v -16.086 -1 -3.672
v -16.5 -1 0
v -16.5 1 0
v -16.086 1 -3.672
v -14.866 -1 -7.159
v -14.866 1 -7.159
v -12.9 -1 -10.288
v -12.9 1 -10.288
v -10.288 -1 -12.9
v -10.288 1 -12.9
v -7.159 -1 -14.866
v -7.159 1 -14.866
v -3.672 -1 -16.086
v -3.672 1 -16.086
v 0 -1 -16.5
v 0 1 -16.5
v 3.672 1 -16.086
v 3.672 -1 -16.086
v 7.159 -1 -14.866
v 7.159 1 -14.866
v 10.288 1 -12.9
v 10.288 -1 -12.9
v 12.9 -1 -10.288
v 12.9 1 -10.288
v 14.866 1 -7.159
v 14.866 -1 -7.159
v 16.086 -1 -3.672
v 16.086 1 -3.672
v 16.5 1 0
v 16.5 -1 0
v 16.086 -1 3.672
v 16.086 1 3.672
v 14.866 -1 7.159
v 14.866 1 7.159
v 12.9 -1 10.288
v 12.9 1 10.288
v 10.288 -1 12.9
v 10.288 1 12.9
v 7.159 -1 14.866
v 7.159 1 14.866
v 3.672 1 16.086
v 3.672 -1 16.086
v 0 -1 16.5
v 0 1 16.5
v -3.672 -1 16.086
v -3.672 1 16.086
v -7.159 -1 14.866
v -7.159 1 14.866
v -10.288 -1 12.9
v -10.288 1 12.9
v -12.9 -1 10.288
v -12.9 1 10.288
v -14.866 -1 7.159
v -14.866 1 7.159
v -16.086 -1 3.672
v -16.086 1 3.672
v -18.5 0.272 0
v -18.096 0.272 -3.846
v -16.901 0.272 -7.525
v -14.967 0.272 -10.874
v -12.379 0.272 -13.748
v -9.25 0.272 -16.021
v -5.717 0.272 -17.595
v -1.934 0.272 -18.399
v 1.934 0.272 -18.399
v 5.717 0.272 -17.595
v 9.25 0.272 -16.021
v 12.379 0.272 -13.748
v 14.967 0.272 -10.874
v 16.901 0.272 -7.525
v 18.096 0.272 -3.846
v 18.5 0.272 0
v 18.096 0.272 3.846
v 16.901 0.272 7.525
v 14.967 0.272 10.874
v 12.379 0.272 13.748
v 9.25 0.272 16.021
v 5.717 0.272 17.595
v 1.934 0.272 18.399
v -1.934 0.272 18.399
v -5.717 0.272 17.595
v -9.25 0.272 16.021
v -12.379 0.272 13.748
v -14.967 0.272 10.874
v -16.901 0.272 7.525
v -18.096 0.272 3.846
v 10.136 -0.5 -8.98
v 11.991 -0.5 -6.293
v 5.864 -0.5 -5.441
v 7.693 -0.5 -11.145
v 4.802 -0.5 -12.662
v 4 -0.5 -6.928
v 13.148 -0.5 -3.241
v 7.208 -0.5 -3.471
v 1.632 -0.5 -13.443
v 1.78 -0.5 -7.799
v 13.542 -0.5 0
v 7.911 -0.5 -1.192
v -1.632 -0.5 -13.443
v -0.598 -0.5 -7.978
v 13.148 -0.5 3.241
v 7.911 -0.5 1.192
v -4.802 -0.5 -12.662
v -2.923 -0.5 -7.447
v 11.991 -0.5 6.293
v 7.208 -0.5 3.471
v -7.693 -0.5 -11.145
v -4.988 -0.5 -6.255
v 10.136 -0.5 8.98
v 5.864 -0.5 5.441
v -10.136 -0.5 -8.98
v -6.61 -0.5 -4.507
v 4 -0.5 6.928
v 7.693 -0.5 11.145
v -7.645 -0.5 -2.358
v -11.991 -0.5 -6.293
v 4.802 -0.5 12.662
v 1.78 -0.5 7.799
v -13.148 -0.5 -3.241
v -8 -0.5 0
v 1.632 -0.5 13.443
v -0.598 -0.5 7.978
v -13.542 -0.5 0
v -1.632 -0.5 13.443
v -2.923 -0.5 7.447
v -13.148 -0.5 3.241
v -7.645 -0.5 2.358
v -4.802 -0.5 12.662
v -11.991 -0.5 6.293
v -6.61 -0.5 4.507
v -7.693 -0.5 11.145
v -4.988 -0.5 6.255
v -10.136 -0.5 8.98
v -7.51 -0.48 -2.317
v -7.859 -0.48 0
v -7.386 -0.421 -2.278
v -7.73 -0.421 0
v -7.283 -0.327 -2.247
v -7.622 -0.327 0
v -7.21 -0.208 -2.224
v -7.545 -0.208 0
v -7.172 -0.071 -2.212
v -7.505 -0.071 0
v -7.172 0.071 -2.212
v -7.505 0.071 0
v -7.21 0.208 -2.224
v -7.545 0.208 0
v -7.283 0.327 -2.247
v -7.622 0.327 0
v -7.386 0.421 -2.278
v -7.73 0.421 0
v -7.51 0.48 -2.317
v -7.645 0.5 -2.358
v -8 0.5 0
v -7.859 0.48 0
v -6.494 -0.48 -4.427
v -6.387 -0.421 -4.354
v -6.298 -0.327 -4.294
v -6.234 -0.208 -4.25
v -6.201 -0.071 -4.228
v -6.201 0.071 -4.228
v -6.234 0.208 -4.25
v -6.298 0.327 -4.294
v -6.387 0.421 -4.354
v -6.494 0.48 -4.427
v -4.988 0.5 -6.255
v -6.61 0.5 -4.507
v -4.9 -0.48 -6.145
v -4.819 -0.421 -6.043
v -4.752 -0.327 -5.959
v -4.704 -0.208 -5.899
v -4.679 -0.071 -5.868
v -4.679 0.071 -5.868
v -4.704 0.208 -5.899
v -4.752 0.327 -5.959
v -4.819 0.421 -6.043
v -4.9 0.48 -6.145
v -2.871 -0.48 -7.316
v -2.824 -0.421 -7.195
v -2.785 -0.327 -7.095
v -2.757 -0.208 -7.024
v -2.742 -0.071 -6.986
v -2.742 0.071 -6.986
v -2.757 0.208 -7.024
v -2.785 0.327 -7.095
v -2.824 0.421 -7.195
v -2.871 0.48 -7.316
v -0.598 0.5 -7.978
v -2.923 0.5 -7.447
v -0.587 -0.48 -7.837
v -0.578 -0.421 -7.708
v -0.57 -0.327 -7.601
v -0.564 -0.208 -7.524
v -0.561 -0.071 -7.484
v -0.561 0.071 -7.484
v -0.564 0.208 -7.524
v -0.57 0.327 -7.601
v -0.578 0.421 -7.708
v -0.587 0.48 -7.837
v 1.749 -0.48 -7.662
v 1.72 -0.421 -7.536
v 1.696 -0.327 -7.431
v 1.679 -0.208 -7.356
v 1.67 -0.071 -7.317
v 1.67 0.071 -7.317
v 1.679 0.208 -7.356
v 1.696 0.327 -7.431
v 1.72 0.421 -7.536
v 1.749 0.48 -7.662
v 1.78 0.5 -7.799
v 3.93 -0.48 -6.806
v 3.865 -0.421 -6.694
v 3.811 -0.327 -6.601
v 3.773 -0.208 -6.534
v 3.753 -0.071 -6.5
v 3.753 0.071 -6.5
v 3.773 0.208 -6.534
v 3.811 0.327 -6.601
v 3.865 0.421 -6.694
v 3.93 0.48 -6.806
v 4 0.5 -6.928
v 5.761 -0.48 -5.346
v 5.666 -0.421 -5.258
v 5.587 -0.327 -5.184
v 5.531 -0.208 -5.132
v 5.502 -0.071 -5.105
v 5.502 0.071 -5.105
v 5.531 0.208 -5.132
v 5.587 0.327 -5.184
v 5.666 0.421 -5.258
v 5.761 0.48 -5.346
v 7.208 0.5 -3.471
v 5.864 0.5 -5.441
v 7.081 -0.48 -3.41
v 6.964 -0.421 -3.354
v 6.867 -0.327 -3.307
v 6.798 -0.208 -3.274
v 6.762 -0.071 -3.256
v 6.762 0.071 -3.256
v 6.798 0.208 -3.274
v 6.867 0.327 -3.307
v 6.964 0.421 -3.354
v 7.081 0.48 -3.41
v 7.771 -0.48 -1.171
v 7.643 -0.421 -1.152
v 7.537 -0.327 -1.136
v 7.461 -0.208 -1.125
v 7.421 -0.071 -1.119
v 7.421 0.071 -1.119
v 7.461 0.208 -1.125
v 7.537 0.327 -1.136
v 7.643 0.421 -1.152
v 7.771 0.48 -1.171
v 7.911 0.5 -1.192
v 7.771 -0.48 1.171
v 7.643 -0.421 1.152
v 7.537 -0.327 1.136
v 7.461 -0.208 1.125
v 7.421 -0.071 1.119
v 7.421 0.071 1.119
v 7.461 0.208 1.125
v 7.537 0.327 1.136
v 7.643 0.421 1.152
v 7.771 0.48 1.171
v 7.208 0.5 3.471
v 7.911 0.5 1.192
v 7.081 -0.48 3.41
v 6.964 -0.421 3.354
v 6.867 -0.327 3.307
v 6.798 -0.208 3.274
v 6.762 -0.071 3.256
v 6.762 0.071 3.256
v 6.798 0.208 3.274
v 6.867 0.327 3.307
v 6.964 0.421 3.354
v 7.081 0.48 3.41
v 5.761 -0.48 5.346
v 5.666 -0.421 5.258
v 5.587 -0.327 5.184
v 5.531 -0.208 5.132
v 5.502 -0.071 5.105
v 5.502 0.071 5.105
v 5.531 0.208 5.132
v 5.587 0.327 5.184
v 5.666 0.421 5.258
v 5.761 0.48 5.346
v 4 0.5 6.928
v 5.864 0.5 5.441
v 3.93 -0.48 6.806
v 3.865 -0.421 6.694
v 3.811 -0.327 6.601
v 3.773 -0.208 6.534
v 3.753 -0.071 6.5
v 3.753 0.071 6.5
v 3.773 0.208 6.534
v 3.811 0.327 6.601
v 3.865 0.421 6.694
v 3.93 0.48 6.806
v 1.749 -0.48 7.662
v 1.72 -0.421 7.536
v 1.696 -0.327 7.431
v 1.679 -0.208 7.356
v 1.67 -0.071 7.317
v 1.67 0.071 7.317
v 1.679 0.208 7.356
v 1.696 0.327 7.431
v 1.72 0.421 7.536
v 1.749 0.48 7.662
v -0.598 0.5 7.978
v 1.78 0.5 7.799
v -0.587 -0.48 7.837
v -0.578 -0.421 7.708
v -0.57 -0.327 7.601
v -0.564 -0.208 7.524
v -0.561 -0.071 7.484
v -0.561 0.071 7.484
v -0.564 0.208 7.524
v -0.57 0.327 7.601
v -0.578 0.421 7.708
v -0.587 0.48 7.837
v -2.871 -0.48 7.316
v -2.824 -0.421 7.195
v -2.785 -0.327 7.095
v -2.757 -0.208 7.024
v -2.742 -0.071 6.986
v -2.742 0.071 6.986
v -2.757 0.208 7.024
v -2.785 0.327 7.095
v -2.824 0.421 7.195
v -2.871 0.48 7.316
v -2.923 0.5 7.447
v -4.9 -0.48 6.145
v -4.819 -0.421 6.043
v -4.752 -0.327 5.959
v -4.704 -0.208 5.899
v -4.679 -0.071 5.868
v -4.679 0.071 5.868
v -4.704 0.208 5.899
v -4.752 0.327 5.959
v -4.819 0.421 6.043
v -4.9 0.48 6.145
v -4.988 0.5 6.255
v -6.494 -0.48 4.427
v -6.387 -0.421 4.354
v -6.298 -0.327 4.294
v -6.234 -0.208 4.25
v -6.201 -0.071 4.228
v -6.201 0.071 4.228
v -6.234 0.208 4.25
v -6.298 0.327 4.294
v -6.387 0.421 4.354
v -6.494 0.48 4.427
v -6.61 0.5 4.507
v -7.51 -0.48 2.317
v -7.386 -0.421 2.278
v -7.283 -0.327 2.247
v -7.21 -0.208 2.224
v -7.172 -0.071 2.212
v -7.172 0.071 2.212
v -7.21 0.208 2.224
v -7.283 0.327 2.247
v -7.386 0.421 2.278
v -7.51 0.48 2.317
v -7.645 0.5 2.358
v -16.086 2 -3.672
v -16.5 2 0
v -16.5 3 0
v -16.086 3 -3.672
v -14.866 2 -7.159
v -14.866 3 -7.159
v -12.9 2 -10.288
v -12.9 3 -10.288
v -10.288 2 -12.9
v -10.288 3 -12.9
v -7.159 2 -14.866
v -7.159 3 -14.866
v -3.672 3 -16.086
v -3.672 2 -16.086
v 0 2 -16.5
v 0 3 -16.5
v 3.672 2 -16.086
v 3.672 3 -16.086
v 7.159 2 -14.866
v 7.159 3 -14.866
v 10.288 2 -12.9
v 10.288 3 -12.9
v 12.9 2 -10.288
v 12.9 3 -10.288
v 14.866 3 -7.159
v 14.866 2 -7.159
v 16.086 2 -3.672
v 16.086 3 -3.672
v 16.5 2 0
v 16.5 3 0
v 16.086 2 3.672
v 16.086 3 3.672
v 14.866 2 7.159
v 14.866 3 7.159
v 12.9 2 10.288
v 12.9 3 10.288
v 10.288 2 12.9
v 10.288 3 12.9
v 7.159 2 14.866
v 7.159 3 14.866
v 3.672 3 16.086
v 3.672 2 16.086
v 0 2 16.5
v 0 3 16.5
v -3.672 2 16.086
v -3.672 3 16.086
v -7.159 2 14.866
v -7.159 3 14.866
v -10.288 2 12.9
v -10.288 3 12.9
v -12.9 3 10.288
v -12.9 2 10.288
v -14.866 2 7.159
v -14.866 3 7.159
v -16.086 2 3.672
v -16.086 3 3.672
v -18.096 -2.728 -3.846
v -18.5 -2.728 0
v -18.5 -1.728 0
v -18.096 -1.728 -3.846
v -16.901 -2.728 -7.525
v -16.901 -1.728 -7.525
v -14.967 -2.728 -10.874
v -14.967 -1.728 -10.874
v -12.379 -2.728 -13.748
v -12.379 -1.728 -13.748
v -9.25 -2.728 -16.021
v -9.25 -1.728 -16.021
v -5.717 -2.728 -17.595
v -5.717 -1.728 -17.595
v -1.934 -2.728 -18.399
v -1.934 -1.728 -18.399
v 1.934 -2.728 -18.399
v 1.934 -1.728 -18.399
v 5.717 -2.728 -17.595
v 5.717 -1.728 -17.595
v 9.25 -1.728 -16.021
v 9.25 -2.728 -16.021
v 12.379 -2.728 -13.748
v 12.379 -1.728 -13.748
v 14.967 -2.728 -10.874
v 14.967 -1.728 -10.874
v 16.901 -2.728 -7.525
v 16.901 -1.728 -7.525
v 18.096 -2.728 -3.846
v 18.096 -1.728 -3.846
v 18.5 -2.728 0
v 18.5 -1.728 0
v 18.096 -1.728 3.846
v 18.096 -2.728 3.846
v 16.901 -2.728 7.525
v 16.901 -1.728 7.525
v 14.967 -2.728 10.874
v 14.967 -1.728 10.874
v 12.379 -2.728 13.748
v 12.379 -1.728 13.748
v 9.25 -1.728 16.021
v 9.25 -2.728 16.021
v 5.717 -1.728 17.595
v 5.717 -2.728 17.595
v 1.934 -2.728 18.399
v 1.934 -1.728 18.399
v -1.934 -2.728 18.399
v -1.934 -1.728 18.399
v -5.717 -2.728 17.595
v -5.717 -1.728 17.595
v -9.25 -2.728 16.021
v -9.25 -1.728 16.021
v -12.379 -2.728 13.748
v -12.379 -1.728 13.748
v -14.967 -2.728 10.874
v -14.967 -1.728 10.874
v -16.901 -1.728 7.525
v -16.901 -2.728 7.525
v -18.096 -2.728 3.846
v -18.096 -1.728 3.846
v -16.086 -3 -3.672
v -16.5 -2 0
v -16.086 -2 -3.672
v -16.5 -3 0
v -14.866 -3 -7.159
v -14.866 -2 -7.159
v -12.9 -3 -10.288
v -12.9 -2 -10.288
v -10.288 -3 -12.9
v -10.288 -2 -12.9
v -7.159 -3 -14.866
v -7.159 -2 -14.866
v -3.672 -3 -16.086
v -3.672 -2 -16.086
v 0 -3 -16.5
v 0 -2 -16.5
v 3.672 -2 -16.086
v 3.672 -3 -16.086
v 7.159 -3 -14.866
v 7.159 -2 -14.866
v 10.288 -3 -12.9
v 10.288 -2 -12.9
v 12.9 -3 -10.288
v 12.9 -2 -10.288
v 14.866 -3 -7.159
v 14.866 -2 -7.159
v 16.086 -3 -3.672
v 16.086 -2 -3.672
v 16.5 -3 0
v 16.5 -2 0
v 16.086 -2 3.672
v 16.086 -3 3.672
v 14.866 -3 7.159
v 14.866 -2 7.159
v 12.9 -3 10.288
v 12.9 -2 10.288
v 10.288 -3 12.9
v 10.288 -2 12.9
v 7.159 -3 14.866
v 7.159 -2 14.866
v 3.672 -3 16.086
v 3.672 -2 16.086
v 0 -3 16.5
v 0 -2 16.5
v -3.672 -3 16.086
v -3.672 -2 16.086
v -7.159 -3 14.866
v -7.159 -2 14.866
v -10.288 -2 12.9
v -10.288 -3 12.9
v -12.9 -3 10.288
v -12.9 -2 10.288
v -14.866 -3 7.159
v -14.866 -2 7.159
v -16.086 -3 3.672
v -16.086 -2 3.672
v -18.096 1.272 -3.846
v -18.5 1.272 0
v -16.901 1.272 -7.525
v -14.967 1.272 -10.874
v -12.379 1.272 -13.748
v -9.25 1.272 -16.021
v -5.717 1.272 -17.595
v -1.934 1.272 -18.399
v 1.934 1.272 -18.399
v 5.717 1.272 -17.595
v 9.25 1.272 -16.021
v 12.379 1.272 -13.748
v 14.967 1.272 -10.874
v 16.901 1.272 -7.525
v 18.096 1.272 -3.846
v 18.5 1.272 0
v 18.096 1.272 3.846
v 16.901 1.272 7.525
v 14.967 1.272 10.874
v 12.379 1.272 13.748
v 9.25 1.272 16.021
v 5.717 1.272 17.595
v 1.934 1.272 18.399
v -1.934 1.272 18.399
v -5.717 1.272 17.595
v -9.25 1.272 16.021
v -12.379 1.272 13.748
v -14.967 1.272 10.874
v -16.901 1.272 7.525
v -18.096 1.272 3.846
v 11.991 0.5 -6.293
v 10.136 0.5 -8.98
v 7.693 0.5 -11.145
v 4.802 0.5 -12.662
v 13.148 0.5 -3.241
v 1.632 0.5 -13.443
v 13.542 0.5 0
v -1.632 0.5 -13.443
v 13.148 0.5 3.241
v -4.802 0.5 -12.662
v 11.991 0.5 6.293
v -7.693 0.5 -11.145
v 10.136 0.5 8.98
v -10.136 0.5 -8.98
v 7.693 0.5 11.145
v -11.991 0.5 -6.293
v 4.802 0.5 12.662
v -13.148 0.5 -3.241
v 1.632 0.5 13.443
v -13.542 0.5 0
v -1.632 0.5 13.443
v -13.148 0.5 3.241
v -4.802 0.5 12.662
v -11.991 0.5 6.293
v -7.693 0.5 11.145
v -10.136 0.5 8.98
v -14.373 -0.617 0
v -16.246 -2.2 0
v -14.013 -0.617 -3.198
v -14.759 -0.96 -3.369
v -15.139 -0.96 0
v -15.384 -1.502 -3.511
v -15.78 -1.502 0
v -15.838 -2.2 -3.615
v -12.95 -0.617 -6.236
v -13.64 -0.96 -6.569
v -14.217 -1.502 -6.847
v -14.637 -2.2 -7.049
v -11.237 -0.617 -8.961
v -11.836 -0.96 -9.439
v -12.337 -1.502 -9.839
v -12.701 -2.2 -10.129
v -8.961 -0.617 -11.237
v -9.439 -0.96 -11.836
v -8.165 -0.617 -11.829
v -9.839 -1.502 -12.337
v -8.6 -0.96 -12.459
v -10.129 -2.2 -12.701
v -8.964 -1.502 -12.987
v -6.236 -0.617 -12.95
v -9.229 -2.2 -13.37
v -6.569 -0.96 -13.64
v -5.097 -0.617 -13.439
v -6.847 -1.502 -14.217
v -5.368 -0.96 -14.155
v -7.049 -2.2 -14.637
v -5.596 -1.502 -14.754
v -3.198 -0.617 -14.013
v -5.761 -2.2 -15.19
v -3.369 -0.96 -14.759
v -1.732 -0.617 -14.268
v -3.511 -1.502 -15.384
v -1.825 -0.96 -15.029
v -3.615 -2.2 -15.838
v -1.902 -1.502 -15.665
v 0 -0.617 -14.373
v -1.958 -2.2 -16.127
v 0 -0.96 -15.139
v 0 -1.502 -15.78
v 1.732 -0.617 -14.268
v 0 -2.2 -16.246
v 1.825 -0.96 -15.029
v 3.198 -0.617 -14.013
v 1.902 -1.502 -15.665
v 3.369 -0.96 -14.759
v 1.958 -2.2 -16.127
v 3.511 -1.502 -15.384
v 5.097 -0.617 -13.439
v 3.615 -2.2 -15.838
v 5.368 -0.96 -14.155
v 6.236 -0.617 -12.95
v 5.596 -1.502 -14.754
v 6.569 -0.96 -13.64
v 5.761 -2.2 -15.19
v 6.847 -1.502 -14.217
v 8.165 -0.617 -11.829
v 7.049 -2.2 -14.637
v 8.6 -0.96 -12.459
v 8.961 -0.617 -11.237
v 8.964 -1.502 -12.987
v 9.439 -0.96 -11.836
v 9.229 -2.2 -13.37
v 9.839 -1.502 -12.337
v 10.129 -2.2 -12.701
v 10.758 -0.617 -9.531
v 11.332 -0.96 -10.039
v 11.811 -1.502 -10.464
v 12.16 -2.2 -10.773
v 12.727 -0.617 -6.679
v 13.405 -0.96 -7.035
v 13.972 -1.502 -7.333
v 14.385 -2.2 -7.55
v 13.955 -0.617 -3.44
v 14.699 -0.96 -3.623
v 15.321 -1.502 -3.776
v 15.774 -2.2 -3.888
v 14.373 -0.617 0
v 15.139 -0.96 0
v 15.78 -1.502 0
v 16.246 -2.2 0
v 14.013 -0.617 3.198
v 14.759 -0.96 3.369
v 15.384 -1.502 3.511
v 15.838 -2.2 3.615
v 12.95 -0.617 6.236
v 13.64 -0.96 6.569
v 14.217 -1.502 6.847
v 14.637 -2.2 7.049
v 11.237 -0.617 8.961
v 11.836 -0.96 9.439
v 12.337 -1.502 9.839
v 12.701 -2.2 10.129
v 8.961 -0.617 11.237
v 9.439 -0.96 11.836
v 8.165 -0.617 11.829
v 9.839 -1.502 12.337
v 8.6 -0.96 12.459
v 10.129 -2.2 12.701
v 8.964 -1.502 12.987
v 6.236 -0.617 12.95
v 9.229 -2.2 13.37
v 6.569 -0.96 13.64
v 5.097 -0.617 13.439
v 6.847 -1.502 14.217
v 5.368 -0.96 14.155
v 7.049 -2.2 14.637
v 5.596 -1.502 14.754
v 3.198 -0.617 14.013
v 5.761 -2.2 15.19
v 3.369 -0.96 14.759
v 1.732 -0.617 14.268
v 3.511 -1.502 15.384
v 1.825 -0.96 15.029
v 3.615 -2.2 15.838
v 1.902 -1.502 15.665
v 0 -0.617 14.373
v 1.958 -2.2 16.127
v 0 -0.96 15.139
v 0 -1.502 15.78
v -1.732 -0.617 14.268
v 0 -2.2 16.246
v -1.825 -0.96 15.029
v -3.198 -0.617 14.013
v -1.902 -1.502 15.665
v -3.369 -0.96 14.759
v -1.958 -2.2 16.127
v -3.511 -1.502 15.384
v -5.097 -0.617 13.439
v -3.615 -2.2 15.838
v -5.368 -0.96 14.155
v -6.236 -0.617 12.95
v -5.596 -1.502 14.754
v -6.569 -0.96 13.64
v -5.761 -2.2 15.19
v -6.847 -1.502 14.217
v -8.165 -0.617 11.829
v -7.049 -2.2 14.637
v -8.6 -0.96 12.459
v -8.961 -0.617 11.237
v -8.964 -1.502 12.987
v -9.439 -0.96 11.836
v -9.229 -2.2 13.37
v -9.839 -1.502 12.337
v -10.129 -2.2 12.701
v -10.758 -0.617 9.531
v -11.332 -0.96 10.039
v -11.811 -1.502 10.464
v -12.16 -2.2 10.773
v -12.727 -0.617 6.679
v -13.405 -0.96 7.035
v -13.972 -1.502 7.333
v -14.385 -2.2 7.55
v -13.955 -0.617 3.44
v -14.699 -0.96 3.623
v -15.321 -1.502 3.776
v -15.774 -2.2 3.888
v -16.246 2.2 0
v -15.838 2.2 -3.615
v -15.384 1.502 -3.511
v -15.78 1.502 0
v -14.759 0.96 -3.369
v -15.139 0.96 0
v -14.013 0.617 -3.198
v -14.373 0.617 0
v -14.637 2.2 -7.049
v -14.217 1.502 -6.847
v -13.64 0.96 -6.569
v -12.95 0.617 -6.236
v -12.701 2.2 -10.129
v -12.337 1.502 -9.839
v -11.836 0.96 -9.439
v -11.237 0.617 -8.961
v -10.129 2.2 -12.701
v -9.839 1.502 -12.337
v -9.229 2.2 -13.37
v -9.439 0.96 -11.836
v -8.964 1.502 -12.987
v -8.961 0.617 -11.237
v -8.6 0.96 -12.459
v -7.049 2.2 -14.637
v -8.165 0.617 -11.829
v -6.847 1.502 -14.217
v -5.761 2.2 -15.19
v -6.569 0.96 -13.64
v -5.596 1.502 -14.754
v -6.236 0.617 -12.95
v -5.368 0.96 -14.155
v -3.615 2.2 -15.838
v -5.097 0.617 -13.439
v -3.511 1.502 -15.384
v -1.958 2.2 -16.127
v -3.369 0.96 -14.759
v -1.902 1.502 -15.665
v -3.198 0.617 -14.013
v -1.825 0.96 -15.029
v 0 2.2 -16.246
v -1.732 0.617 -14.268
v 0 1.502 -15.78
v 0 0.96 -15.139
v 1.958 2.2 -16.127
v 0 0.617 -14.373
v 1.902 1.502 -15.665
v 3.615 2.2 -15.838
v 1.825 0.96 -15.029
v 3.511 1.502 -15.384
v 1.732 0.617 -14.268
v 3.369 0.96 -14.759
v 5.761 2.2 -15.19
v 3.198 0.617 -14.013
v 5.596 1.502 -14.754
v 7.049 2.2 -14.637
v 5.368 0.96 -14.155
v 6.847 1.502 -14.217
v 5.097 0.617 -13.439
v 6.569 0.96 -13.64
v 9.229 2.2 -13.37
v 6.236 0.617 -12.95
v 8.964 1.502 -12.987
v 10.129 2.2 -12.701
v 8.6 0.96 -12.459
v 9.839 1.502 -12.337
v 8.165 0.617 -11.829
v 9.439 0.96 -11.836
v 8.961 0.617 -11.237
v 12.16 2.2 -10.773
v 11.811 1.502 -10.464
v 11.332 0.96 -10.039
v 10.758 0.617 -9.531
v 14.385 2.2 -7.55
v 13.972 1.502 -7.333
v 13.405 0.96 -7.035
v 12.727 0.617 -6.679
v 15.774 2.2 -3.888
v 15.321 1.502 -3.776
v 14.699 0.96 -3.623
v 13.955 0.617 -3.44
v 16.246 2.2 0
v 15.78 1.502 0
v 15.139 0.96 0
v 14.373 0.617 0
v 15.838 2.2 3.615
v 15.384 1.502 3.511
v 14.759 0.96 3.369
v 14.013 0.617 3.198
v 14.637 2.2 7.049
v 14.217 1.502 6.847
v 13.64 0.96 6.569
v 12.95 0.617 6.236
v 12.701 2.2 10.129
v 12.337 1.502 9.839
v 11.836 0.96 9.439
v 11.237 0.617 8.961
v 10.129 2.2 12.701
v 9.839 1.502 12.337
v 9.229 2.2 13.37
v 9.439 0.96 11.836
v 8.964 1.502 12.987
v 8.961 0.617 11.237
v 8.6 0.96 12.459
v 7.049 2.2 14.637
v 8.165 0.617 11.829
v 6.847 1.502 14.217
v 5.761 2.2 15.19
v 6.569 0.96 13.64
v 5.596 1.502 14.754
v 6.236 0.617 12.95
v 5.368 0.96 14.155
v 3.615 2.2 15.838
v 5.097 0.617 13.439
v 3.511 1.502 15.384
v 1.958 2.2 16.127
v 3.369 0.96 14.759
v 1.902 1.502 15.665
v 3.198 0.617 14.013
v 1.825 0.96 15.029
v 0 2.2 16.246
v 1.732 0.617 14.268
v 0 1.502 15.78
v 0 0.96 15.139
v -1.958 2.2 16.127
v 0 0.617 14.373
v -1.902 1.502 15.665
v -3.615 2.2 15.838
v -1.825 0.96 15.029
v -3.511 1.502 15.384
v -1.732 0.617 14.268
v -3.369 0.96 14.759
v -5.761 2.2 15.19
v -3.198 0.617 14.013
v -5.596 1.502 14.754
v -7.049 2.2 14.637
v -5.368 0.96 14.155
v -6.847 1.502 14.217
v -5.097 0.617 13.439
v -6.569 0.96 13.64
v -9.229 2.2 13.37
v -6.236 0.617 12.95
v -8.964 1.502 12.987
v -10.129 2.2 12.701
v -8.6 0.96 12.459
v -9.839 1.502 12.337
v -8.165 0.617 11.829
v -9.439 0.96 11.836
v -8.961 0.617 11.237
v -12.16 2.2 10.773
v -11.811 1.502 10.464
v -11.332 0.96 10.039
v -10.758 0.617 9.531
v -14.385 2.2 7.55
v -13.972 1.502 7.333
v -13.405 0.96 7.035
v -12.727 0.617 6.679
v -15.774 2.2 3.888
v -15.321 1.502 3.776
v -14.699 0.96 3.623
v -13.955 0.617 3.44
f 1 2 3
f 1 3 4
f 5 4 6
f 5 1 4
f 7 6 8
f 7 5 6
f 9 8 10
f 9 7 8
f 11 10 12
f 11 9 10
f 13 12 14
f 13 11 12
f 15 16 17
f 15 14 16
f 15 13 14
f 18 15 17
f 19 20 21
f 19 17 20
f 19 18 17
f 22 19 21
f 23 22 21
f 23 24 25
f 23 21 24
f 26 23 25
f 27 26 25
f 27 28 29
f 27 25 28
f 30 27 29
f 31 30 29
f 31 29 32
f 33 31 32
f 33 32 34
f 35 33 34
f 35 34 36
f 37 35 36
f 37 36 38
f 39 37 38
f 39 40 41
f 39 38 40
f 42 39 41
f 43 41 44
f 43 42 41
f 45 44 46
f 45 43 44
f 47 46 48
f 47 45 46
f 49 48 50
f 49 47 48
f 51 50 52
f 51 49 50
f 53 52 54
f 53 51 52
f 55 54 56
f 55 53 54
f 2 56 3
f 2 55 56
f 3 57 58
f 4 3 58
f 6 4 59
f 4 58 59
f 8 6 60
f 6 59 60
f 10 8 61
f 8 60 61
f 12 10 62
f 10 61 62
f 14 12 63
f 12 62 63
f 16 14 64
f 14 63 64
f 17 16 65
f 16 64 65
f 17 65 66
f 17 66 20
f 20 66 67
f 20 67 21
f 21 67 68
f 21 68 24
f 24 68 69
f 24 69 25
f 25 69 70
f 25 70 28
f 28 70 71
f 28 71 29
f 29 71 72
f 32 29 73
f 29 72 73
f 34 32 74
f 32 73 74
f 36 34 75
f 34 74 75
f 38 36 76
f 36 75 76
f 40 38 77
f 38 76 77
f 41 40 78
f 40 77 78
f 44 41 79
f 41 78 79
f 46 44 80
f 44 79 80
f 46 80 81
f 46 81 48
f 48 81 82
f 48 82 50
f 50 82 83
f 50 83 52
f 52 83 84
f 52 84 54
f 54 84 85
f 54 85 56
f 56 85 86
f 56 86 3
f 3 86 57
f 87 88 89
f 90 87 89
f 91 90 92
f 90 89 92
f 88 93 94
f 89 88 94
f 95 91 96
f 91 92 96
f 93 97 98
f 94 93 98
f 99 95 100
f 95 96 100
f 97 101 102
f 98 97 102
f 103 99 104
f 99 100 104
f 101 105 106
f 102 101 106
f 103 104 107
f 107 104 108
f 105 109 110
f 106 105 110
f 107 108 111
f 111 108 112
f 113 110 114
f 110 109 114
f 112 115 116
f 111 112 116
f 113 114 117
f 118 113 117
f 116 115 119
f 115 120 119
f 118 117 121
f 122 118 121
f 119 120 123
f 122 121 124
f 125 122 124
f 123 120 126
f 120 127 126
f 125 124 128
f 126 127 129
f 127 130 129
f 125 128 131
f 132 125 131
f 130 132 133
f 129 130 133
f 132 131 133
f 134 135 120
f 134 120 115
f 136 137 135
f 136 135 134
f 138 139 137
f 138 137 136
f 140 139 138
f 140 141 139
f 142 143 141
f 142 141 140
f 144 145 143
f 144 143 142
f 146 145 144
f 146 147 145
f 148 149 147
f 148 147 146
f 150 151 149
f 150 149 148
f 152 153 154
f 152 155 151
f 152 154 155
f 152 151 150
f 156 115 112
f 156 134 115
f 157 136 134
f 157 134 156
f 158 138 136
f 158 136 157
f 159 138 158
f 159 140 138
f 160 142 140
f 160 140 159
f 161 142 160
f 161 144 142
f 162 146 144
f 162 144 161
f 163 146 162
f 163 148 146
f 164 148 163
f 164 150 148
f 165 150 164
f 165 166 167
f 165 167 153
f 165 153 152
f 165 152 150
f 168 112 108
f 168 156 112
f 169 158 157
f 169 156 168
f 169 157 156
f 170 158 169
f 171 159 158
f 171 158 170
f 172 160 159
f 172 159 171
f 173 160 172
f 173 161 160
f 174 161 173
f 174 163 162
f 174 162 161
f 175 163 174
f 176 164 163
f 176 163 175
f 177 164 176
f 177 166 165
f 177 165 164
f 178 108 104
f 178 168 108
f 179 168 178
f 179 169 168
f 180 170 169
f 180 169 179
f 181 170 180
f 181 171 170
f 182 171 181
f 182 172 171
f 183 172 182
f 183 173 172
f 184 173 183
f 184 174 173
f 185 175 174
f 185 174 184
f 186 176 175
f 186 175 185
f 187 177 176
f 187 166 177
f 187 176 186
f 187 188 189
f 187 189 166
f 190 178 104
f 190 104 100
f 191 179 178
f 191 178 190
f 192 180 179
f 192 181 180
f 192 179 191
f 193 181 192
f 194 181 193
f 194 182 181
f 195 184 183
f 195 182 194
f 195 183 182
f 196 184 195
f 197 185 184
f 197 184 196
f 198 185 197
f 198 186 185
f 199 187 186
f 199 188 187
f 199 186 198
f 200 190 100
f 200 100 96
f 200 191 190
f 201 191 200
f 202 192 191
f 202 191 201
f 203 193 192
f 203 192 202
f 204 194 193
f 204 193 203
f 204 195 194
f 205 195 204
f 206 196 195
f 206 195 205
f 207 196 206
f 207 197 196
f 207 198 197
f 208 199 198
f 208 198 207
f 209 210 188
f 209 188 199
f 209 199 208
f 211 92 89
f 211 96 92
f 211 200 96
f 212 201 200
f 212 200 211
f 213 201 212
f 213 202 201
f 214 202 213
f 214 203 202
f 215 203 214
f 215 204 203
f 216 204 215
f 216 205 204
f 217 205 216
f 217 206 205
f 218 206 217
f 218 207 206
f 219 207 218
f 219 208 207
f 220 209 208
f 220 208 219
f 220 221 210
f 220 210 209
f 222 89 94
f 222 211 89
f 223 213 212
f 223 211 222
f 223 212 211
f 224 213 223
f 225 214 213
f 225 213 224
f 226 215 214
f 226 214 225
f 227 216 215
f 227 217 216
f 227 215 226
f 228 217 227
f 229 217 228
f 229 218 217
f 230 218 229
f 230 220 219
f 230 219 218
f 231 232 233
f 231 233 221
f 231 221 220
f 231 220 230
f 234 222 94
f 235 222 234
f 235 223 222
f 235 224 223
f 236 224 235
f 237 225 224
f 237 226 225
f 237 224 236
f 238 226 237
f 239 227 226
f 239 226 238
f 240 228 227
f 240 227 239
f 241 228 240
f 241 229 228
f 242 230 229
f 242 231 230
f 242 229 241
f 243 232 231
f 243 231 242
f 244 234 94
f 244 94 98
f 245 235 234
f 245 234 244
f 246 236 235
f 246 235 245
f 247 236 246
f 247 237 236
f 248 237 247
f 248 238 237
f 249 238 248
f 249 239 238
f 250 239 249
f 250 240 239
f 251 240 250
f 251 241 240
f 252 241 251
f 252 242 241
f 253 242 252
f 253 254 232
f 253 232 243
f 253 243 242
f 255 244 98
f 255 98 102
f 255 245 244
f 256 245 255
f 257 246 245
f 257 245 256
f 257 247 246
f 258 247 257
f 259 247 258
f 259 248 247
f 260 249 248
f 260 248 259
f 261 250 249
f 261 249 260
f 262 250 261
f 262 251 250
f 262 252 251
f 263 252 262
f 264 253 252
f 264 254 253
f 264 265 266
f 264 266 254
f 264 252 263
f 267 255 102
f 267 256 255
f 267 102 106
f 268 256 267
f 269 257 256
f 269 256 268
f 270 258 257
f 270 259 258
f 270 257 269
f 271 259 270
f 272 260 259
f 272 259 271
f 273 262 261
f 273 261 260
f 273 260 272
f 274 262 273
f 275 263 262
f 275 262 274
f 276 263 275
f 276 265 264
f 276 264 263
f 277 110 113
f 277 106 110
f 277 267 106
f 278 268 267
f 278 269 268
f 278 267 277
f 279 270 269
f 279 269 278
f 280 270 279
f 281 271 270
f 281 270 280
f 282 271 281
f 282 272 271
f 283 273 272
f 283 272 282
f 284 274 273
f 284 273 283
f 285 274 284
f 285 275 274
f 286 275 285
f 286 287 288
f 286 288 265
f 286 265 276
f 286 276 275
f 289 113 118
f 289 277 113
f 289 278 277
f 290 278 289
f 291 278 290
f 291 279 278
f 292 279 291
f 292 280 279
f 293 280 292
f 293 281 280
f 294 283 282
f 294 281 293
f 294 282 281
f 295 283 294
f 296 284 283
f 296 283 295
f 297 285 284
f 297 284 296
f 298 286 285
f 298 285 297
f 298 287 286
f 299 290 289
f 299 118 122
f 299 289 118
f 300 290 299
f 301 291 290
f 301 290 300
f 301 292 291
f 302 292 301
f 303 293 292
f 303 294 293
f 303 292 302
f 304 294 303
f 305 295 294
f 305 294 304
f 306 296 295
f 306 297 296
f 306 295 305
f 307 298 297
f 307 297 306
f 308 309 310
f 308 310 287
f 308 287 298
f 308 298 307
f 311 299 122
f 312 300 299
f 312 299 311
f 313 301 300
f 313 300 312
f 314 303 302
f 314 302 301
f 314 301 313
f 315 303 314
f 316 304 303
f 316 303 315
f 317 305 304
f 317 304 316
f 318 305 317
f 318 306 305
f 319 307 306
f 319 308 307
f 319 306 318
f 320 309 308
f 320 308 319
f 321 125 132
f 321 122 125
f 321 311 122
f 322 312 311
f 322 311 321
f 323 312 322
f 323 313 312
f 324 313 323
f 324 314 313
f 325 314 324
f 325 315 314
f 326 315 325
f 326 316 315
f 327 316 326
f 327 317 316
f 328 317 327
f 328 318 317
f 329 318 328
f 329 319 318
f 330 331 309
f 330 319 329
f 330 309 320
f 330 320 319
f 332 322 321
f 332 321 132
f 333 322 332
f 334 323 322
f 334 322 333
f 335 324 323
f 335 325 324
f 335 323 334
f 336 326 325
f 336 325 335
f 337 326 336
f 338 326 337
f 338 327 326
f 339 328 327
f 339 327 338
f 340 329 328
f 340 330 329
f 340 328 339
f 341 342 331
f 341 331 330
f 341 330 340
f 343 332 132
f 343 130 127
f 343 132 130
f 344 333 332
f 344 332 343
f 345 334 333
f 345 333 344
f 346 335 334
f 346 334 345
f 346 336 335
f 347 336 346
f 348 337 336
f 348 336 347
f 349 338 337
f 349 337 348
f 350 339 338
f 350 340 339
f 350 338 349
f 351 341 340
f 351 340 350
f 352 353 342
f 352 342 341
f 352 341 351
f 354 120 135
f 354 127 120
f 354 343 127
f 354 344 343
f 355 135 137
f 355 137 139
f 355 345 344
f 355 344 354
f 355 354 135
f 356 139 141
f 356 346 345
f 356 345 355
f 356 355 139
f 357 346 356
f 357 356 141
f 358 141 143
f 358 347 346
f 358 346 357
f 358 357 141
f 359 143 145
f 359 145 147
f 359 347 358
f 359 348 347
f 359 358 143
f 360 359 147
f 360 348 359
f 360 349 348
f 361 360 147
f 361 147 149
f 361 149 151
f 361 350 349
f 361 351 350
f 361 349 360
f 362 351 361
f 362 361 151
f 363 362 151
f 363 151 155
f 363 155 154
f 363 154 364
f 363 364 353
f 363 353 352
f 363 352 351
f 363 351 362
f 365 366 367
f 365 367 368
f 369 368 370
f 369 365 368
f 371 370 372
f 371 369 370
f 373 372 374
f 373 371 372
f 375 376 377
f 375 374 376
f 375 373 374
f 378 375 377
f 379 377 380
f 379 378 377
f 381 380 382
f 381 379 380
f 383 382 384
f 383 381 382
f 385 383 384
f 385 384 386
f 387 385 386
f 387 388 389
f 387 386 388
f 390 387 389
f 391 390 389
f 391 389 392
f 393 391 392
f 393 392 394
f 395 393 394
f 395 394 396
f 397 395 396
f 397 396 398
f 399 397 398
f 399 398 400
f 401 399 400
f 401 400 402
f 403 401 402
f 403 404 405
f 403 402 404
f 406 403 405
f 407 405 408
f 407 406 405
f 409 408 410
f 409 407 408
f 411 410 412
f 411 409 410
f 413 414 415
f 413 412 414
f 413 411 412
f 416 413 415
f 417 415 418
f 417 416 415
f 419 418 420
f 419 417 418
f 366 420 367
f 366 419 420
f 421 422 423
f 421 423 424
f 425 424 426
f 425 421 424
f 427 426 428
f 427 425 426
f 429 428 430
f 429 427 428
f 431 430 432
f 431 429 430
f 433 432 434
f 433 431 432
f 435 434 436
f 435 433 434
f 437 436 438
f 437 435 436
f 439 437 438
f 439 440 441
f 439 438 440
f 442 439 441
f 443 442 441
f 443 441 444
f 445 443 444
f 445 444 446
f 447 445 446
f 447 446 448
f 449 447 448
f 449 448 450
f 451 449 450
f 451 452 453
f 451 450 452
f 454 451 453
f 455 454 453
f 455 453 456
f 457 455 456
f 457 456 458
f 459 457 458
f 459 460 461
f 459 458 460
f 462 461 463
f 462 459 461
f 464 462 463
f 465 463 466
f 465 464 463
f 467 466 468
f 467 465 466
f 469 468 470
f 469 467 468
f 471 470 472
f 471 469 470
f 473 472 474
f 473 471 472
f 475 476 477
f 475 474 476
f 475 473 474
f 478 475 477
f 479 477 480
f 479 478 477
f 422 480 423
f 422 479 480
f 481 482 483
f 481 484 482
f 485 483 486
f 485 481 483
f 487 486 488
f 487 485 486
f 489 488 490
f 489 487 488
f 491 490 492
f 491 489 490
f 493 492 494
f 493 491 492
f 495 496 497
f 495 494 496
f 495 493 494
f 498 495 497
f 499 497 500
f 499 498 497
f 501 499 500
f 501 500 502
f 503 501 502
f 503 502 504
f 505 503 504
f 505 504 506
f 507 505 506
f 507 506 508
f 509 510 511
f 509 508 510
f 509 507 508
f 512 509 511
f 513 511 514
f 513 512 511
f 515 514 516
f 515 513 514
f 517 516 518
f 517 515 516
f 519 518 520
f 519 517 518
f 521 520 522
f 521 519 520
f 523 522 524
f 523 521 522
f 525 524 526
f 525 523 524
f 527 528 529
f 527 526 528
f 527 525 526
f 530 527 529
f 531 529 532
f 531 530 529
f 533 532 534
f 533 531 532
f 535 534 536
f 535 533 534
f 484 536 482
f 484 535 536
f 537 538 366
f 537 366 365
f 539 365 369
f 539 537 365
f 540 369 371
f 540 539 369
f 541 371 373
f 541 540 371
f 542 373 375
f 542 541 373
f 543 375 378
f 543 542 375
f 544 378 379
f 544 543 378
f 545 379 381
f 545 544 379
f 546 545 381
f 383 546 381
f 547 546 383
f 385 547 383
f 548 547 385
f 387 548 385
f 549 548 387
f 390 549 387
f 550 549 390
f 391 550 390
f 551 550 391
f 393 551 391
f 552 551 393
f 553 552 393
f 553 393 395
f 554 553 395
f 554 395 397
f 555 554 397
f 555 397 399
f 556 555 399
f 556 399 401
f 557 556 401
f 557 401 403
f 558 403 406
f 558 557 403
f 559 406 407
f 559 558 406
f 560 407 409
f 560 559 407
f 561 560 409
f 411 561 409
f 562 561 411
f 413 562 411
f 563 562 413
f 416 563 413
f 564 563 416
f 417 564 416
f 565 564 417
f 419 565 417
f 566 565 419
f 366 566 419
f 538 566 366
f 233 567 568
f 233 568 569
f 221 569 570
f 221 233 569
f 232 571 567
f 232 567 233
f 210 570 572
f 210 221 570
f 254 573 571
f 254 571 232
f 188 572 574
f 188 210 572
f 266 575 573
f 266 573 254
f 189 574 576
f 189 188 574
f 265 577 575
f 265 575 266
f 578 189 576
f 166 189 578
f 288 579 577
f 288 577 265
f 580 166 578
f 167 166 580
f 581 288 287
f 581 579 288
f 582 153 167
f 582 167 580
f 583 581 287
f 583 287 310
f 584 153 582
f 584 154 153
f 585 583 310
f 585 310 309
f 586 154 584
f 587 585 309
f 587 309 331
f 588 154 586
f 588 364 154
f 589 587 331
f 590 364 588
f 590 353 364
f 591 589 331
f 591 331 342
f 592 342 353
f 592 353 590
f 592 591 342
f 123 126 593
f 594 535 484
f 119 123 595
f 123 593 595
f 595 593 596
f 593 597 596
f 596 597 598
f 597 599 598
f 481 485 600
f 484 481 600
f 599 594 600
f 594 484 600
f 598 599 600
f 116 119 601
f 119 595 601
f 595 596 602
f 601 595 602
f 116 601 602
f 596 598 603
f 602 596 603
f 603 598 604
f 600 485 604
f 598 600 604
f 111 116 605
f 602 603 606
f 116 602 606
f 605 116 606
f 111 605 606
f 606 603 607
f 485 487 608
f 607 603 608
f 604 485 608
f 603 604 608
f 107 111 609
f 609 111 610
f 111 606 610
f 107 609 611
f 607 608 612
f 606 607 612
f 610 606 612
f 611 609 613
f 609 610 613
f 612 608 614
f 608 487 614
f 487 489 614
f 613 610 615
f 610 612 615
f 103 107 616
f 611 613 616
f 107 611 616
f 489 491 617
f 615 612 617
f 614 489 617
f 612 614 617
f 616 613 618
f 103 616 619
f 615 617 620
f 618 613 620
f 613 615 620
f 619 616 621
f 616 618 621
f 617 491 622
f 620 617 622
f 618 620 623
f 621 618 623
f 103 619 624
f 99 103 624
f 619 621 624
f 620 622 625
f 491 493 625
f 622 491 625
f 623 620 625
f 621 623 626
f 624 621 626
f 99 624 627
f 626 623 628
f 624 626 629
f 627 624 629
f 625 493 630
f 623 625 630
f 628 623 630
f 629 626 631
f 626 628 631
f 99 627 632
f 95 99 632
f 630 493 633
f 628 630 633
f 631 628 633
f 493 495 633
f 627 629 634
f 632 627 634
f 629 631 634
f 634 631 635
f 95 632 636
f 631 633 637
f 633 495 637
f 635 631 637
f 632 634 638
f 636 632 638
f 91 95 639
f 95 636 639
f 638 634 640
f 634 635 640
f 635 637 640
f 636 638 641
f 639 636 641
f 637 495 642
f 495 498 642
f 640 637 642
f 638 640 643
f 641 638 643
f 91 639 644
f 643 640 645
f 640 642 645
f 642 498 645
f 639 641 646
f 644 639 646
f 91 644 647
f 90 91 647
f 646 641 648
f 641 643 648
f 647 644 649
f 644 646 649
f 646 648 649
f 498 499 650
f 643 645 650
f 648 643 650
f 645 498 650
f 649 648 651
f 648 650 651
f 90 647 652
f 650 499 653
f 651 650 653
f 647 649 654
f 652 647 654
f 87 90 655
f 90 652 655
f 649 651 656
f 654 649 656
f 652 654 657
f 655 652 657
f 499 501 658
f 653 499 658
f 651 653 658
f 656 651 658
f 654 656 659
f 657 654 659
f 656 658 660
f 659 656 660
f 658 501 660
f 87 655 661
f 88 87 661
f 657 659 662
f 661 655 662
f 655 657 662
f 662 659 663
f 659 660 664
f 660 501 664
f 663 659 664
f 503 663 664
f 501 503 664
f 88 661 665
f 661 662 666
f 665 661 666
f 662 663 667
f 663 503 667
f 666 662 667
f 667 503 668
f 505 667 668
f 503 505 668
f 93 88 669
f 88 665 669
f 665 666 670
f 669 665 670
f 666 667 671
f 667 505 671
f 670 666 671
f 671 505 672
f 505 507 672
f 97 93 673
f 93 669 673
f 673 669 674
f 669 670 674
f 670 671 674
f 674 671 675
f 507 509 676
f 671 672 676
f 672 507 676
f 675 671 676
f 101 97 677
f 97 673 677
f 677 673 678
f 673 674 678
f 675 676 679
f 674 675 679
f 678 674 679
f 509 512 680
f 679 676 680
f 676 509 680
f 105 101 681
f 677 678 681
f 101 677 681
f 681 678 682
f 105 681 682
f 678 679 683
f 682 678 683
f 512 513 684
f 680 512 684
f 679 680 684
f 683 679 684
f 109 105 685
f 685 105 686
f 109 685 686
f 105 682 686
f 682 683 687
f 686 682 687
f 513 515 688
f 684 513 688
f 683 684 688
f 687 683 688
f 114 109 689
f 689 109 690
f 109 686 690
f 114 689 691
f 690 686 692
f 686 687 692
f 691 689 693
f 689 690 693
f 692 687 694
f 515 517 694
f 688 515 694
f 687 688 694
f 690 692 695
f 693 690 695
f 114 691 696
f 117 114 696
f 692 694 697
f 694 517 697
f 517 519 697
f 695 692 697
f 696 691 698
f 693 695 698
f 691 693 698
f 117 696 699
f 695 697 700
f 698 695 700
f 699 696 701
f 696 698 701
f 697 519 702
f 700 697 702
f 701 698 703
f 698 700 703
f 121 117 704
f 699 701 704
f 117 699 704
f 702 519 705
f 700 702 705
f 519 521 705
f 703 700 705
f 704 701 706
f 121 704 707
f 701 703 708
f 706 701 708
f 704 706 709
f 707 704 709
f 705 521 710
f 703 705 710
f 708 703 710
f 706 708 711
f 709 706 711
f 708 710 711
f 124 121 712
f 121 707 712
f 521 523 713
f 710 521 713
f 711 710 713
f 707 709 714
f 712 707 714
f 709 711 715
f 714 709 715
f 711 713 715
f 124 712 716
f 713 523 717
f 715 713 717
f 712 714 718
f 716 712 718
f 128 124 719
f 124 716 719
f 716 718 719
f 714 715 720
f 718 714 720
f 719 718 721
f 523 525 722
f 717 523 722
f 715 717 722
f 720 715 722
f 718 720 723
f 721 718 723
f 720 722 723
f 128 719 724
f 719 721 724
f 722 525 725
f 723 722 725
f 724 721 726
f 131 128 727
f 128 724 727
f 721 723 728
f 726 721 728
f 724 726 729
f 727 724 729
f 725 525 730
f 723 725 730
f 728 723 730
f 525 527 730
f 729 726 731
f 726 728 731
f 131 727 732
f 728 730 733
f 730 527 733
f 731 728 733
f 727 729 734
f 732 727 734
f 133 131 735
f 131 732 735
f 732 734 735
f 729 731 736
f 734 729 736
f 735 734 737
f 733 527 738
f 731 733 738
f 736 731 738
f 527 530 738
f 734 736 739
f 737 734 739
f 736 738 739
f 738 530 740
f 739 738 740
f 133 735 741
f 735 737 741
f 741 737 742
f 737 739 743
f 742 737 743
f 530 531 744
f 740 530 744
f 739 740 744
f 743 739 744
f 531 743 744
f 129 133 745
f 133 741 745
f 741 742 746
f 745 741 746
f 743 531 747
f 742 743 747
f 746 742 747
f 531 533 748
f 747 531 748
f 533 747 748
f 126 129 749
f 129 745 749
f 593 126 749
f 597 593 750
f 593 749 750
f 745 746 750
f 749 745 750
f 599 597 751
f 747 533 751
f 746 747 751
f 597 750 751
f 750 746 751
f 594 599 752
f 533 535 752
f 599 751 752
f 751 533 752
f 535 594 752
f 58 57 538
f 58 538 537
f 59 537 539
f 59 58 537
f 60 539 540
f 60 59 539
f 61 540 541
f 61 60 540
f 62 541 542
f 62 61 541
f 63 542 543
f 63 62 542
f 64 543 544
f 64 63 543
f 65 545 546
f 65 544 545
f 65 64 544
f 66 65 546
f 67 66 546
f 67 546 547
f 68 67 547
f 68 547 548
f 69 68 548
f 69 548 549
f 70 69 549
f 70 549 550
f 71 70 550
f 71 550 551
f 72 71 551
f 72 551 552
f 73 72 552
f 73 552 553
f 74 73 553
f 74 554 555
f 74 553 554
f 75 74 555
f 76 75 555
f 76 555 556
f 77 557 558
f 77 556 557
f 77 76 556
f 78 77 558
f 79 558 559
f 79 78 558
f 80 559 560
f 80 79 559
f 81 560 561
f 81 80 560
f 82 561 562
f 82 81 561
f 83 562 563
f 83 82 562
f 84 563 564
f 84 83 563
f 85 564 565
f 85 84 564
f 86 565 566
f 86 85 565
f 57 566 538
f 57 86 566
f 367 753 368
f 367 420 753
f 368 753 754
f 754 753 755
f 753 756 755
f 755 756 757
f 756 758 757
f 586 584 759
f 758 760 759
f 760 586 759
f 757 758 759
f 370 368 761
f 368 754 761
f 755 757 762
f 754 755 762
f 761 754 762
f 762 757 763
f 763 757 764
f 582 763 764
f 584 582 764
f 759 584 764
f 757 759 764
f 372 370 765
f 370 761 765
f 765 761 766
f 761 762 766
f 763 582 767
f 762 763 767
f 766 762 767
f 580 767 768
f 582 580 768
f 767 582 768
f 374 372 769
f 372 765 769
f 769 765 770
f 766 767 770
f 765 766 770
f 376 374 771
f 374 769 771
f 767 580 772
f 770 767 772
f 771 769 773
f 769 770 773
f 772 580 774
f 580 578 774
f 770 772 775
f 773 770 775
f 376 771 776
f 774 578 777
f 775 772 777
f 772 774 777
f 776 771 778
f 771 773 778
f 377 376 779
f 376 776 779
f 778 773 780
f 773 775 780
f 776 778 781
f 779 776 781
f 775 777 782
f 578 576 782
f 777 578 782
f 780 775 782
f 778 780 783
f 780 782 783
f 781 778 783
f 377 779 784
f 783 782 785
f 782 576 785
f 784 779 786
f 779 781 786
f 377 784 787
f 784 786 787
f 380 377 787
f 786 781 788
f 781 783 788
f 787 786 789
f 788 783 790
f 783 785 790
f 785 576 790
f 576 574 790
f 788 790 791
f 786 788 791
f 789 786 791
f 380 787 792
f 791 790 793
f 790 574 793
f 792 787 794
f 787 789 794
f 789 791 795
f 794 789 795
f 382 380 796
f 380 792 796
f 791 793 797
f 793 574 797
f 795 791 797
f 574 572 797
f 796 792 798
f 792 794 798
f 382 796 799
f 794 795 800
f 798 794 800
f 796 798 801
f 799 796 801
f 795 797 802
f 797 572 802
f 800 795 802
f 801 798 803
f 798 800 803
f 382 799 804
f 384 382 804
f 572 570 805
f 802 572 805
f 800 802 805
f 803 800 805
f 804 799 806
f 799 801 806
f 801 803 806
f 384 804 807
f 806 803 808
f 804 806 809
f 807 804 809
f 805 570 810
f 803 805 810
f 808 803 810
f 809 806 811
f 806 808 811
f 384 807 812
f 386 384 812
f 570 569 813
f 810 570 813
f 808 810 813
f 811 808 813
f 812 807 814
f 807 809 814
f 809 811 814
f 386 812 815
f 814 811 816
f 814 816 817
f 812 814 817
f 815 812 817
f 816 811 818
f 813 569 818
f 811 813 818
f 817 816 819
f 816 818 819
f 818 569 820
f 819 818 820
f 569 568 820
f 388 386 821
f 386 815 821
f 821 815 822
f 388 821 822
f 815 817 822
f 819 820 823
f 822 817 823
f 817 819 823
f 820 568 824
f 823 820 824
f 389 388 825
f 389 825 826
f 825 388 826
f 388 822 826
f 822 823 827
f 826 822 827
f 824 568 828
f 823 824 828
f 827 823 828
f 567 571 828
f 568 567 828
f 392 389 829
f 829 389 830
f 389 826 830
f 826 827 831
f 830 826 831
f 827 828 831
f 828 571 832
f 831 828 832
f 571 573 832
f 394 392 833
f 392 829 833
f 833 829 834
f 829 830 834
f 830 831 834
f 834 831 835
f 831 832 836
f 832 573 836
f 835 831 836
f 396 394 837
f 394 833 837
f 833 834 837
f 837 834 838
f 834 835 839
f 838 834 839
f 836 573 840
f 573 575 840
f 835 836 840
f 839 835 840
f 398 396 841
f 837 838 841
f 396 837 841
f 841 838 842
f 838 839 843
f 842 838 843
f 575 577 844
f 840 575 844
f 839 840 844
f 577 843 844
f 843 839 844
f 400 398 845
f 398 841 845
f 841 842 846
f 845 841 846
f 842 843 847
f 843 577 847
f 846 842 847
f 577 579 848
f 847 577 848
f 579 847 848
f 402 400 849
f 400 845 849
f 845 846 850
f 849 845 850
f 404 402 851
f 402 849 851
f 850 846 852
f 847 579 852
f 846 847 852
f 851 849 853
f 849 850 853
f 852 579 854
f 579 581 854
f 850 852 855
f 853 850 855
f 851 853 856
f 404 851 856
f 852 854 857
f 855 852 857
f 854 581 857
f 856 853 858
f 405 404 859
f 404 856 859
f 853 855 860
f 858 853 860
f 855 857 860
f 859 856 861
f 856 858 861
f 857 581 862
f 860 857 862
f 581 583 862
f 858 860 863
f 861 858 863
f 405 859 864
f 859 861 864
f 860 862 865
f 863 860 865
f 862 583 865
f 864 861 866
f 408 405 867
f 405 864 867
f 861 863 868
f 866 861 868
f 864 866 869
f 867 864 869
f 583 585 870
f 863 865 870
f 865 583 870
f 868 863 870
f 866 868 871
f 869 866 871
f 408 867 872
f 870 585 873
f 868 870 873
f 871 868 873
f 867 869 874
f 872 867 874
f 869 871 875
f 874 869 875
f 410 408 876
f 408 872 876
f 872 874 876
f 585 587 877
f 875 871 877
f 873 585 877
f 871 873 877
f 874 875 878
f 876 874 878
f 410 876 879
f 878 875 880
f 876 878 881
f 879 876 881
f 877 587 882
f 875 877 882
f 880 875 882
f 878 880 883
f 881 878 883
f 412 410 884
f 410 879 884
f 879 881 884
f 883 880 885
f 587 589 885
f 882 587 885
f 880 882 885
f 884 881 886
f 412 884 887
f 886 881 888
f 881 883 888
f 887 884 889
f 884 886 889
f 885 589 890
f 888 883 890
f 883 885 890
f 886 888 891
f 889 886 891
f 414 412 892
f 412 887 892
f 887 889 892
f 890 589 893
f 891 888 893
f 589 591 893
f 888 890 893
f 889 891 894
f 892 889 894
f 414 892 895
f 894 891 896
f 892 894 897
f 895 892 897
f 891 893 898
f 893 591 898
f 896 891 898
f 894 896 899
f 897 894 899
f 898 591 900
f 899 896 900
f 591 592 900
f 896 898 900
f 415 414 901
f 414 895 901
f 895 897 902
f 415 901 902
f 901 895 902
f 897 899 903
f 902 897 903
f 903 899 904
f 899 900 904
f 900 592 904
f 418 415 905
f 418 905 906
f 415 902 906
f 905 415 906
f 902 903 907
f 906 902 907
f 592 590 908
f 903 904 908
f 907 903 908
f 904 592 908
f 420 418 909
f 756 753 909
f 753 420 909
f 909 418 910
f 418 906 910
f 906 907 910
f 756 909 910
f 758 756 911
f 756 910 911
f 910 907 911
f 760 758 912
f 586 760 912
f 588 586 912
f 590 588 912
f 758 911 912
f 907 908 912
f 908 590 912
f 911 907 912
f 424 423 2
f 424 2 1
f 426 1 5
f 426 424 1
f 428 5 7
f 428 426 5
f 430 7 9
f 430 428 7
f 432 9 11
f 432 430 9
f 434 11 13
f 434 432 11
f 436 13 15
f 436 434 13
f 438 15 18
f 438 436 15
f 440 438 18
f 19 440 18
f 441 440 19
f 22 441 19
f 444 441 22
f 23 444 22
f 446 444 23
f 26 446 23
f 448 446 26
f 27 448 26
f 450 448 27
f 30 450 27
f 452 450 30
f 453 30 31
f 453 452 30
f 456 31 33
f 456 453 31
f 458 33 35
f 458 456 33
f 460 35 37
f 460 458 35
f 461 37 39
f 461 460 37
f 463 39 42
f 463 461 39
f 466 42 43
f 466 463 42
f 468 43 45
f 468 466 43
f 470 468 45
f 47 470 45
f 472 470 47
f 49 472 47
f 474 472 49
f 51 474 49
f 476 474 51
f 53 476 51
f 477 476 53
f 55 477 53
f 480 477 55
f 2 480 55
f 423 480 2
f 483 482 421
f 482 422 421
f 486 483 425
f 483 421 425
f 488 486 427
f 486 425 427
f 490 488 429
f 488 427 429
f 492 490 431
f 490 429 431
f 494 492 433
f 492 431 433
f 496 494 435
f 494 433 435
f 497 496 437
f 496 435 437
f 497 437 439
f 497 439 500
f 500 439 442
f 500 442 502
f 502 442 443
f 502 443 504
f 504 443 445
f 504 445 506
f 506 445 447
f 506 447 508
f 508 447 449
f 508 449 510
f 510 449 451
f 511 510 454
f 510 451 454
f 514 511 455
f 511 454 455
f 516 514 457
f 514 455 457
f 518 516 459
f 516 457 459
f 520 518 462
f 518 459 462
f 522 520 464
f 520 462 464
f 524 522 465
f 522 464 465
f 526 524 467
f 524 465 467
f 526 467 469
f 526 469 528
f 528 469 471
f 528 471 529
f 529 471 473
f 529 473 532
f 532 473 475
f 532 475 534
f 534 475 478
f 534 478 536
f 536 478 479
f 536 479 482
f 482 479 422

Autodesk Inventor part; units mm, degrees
ref_plane "YZ Plane" through (0, 0, 0) normal (1, 0, 0) x (0, 1, 0)
ref_plane "XZ Plane" through (0, 0, 0) normal (0, 1, 0) x (-1, 0, 0)
ref_plane "XY Plane" through (0, 0, 0) normal (0, 0, 1) x (1, 0, 0)
sketch "Sketch1" plane through (0, 0, 0) normal (0, 0, 1) x (1, 0, 0)
  line L0 (-8, -0.5) -> (-13.542, -0.5)
  arc A0 (-8, -0.5) -> (-8, 0.5) centre (-8, 0) ccw
  line L1 (-8, 0.5) -> (-13.542, 0.5)
  arc A1 (-16.5, 3) -> (-13.542, 0.5) centre (-13.542, 3.5) ccw
  line L2 (-16.5, 3) -> (-16.5, 2)
  line L3 (-16.5, 2) -> (-18.5, 1.2721)
  line L4 (-18.5, 1.2721) -> (-18.5, 0.2721)
  line L5 (-18.5, 0.2721) -> (-16.5, 1)
  arc A2 (-13.542, -0.5) -> (-16.5, -3) centre (-13.542, -3.5) ccw
  line L6 (-22.2, 0) -> (3.7, 0) construction
  line L7 (0, -4.9) -> (0, 4.9) construction
  line L8 (-16.5, 1) -> (-16.5, -1)
  line L9 (-16.5, -1) -> (-18.5, -1.7279)
  line L10 (-18.5, -1.7279) -> (-18.5, -2.7279)
  line L11 (-18.5, -2.7279) -> (-16.5, -2)
  line L12 (-16.5, -2) -> (-16.5, -3)
  point P0 (0, 0)
  point P1 (-7.5, 0)
  dimension "d3" = 15
  dimension "d4" = 33
  dimension "d5" = 2
  dimension "d7" = 1
  dimension "d8" = 6
  dimension "d9" = 3
  dimension "d10" = 1
  dimension "d12" = 2
  dimension "d13" = 5.542
  dimension "d15" = 0.7279
  dimension "d16" = 70
revolve "Revolution1" add sketch "Sketch1" angle 360 about axis through (0, -10, 0) along (0, 1, 0)
properties part number "Sealingring"
